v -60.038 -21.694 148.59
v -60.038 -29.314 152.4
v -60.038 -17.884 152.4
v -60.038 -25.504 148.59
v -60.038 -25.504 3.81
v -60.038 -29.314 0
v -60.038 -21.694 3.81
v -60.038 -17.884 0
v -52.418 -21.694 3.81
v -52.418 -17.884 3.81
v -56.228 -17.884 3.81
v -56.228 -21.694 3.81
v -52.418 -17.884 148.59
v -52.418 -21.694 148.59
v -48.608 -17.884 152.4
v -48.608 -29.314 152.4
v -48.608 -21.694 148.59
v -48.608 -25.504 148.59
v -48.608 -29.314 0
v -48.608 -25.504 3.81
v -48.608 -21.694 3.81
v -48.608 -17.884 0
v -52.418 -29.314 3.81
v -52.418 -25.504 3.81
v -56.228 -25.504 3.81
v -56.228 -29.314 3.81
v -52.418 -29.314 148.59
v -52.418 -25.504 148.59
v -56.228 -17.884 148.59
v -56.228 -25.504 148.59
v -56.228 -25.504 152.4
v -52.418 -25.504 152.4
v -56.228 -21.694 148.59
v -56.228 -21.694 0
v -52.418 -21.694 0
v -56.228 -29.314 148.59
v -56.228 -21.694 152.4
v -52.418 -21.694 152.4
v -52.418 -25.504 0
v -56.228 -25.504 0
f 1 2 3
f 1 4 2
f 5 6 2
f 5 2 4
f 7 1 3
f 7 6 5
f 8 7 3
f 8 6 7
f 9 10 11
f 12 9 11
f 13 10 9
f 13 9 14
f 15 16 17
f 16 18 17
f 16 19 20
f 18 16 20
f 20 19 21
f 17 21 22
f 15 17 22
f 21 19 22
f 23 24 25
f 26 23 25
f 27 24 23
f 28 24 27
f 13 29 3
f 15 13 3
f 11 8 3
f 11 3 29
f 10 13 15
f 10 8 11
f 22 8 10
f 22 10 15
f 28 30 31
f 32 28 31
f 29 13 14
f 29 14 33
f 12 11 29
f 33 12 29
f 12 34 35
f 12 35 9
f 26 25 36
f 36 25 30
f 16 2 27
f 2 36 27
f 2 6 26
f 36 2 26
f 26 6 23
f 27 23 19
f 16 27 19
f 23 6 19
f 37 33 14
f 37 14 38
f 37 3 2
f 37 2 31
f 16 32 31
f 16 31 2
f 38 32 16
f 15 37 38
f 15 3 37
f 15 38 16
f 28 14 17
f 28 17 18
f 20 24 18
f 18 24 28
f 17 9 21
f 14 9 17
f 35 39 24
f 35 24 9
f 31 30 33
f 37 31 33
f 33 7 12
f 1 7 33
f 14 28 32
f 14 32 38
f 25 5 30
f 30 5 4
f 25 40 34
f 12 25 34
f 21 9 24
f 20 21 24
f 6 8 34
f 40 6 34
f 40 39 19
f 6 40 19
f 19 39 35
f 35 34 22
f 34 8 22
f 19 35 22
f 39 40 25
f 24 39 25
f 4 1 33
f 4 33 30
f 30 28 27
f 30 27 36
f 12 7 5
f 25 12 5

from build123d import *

# Parameters (mm, degrees)
F0_W     = 11.43
F0_H     = 11.43
F0_W_2   = 3.81
F0_H_2   = 3.81
F1_DEPTH = 152.4
F2_W     = 3.81
F2_H     = 144.78
F3_DEPTH = 25.4
F4_W     = 3.81
F4_H     = 144.78
F5_DEPTH = 25.4


with BuildPart() as f1:
    # F0 (on Top) → F1 (new body)
    with BuildSketch(Plane.XY):
        with Locations((-54.323498, -23.599323)):
            Rectangle(F0_W, F0_H)
        with Locations((-54.323498, -23.599323)):
            Rectangle(F0_W_2, F0_H_2, mode=Mode.SUBTRACT)
    extrude(amount=F1_DEPTH)

    # F2 (on face) → F3 (cut)
    with BuildSketch(Plane(origin=(-60.038498, 0, 0), x_dir=(0, -1, 0), z_dir=(-1, 0, 0))):
        with Locations((23.599323, 76.2)):
            Rectangle(F2_W, F2_H)
    extrude(amount=-F3_DEPTH, mode=Mode.SUBTRACT)

    # F4 (on face) → F5 (cut)
    with BuildSketch(Plane(origin=(0, -17.884323, 0), x_dir=(-1, 0, 0), z_dir=(0, 1, 0))):
        with Locations((54.323498, 76.2)):
            Rectangle(F4_W, F4_H)
    extrude(amount=-F5_DEPTH, mode=Mode.SUBTRACT)


solid = f1.part
